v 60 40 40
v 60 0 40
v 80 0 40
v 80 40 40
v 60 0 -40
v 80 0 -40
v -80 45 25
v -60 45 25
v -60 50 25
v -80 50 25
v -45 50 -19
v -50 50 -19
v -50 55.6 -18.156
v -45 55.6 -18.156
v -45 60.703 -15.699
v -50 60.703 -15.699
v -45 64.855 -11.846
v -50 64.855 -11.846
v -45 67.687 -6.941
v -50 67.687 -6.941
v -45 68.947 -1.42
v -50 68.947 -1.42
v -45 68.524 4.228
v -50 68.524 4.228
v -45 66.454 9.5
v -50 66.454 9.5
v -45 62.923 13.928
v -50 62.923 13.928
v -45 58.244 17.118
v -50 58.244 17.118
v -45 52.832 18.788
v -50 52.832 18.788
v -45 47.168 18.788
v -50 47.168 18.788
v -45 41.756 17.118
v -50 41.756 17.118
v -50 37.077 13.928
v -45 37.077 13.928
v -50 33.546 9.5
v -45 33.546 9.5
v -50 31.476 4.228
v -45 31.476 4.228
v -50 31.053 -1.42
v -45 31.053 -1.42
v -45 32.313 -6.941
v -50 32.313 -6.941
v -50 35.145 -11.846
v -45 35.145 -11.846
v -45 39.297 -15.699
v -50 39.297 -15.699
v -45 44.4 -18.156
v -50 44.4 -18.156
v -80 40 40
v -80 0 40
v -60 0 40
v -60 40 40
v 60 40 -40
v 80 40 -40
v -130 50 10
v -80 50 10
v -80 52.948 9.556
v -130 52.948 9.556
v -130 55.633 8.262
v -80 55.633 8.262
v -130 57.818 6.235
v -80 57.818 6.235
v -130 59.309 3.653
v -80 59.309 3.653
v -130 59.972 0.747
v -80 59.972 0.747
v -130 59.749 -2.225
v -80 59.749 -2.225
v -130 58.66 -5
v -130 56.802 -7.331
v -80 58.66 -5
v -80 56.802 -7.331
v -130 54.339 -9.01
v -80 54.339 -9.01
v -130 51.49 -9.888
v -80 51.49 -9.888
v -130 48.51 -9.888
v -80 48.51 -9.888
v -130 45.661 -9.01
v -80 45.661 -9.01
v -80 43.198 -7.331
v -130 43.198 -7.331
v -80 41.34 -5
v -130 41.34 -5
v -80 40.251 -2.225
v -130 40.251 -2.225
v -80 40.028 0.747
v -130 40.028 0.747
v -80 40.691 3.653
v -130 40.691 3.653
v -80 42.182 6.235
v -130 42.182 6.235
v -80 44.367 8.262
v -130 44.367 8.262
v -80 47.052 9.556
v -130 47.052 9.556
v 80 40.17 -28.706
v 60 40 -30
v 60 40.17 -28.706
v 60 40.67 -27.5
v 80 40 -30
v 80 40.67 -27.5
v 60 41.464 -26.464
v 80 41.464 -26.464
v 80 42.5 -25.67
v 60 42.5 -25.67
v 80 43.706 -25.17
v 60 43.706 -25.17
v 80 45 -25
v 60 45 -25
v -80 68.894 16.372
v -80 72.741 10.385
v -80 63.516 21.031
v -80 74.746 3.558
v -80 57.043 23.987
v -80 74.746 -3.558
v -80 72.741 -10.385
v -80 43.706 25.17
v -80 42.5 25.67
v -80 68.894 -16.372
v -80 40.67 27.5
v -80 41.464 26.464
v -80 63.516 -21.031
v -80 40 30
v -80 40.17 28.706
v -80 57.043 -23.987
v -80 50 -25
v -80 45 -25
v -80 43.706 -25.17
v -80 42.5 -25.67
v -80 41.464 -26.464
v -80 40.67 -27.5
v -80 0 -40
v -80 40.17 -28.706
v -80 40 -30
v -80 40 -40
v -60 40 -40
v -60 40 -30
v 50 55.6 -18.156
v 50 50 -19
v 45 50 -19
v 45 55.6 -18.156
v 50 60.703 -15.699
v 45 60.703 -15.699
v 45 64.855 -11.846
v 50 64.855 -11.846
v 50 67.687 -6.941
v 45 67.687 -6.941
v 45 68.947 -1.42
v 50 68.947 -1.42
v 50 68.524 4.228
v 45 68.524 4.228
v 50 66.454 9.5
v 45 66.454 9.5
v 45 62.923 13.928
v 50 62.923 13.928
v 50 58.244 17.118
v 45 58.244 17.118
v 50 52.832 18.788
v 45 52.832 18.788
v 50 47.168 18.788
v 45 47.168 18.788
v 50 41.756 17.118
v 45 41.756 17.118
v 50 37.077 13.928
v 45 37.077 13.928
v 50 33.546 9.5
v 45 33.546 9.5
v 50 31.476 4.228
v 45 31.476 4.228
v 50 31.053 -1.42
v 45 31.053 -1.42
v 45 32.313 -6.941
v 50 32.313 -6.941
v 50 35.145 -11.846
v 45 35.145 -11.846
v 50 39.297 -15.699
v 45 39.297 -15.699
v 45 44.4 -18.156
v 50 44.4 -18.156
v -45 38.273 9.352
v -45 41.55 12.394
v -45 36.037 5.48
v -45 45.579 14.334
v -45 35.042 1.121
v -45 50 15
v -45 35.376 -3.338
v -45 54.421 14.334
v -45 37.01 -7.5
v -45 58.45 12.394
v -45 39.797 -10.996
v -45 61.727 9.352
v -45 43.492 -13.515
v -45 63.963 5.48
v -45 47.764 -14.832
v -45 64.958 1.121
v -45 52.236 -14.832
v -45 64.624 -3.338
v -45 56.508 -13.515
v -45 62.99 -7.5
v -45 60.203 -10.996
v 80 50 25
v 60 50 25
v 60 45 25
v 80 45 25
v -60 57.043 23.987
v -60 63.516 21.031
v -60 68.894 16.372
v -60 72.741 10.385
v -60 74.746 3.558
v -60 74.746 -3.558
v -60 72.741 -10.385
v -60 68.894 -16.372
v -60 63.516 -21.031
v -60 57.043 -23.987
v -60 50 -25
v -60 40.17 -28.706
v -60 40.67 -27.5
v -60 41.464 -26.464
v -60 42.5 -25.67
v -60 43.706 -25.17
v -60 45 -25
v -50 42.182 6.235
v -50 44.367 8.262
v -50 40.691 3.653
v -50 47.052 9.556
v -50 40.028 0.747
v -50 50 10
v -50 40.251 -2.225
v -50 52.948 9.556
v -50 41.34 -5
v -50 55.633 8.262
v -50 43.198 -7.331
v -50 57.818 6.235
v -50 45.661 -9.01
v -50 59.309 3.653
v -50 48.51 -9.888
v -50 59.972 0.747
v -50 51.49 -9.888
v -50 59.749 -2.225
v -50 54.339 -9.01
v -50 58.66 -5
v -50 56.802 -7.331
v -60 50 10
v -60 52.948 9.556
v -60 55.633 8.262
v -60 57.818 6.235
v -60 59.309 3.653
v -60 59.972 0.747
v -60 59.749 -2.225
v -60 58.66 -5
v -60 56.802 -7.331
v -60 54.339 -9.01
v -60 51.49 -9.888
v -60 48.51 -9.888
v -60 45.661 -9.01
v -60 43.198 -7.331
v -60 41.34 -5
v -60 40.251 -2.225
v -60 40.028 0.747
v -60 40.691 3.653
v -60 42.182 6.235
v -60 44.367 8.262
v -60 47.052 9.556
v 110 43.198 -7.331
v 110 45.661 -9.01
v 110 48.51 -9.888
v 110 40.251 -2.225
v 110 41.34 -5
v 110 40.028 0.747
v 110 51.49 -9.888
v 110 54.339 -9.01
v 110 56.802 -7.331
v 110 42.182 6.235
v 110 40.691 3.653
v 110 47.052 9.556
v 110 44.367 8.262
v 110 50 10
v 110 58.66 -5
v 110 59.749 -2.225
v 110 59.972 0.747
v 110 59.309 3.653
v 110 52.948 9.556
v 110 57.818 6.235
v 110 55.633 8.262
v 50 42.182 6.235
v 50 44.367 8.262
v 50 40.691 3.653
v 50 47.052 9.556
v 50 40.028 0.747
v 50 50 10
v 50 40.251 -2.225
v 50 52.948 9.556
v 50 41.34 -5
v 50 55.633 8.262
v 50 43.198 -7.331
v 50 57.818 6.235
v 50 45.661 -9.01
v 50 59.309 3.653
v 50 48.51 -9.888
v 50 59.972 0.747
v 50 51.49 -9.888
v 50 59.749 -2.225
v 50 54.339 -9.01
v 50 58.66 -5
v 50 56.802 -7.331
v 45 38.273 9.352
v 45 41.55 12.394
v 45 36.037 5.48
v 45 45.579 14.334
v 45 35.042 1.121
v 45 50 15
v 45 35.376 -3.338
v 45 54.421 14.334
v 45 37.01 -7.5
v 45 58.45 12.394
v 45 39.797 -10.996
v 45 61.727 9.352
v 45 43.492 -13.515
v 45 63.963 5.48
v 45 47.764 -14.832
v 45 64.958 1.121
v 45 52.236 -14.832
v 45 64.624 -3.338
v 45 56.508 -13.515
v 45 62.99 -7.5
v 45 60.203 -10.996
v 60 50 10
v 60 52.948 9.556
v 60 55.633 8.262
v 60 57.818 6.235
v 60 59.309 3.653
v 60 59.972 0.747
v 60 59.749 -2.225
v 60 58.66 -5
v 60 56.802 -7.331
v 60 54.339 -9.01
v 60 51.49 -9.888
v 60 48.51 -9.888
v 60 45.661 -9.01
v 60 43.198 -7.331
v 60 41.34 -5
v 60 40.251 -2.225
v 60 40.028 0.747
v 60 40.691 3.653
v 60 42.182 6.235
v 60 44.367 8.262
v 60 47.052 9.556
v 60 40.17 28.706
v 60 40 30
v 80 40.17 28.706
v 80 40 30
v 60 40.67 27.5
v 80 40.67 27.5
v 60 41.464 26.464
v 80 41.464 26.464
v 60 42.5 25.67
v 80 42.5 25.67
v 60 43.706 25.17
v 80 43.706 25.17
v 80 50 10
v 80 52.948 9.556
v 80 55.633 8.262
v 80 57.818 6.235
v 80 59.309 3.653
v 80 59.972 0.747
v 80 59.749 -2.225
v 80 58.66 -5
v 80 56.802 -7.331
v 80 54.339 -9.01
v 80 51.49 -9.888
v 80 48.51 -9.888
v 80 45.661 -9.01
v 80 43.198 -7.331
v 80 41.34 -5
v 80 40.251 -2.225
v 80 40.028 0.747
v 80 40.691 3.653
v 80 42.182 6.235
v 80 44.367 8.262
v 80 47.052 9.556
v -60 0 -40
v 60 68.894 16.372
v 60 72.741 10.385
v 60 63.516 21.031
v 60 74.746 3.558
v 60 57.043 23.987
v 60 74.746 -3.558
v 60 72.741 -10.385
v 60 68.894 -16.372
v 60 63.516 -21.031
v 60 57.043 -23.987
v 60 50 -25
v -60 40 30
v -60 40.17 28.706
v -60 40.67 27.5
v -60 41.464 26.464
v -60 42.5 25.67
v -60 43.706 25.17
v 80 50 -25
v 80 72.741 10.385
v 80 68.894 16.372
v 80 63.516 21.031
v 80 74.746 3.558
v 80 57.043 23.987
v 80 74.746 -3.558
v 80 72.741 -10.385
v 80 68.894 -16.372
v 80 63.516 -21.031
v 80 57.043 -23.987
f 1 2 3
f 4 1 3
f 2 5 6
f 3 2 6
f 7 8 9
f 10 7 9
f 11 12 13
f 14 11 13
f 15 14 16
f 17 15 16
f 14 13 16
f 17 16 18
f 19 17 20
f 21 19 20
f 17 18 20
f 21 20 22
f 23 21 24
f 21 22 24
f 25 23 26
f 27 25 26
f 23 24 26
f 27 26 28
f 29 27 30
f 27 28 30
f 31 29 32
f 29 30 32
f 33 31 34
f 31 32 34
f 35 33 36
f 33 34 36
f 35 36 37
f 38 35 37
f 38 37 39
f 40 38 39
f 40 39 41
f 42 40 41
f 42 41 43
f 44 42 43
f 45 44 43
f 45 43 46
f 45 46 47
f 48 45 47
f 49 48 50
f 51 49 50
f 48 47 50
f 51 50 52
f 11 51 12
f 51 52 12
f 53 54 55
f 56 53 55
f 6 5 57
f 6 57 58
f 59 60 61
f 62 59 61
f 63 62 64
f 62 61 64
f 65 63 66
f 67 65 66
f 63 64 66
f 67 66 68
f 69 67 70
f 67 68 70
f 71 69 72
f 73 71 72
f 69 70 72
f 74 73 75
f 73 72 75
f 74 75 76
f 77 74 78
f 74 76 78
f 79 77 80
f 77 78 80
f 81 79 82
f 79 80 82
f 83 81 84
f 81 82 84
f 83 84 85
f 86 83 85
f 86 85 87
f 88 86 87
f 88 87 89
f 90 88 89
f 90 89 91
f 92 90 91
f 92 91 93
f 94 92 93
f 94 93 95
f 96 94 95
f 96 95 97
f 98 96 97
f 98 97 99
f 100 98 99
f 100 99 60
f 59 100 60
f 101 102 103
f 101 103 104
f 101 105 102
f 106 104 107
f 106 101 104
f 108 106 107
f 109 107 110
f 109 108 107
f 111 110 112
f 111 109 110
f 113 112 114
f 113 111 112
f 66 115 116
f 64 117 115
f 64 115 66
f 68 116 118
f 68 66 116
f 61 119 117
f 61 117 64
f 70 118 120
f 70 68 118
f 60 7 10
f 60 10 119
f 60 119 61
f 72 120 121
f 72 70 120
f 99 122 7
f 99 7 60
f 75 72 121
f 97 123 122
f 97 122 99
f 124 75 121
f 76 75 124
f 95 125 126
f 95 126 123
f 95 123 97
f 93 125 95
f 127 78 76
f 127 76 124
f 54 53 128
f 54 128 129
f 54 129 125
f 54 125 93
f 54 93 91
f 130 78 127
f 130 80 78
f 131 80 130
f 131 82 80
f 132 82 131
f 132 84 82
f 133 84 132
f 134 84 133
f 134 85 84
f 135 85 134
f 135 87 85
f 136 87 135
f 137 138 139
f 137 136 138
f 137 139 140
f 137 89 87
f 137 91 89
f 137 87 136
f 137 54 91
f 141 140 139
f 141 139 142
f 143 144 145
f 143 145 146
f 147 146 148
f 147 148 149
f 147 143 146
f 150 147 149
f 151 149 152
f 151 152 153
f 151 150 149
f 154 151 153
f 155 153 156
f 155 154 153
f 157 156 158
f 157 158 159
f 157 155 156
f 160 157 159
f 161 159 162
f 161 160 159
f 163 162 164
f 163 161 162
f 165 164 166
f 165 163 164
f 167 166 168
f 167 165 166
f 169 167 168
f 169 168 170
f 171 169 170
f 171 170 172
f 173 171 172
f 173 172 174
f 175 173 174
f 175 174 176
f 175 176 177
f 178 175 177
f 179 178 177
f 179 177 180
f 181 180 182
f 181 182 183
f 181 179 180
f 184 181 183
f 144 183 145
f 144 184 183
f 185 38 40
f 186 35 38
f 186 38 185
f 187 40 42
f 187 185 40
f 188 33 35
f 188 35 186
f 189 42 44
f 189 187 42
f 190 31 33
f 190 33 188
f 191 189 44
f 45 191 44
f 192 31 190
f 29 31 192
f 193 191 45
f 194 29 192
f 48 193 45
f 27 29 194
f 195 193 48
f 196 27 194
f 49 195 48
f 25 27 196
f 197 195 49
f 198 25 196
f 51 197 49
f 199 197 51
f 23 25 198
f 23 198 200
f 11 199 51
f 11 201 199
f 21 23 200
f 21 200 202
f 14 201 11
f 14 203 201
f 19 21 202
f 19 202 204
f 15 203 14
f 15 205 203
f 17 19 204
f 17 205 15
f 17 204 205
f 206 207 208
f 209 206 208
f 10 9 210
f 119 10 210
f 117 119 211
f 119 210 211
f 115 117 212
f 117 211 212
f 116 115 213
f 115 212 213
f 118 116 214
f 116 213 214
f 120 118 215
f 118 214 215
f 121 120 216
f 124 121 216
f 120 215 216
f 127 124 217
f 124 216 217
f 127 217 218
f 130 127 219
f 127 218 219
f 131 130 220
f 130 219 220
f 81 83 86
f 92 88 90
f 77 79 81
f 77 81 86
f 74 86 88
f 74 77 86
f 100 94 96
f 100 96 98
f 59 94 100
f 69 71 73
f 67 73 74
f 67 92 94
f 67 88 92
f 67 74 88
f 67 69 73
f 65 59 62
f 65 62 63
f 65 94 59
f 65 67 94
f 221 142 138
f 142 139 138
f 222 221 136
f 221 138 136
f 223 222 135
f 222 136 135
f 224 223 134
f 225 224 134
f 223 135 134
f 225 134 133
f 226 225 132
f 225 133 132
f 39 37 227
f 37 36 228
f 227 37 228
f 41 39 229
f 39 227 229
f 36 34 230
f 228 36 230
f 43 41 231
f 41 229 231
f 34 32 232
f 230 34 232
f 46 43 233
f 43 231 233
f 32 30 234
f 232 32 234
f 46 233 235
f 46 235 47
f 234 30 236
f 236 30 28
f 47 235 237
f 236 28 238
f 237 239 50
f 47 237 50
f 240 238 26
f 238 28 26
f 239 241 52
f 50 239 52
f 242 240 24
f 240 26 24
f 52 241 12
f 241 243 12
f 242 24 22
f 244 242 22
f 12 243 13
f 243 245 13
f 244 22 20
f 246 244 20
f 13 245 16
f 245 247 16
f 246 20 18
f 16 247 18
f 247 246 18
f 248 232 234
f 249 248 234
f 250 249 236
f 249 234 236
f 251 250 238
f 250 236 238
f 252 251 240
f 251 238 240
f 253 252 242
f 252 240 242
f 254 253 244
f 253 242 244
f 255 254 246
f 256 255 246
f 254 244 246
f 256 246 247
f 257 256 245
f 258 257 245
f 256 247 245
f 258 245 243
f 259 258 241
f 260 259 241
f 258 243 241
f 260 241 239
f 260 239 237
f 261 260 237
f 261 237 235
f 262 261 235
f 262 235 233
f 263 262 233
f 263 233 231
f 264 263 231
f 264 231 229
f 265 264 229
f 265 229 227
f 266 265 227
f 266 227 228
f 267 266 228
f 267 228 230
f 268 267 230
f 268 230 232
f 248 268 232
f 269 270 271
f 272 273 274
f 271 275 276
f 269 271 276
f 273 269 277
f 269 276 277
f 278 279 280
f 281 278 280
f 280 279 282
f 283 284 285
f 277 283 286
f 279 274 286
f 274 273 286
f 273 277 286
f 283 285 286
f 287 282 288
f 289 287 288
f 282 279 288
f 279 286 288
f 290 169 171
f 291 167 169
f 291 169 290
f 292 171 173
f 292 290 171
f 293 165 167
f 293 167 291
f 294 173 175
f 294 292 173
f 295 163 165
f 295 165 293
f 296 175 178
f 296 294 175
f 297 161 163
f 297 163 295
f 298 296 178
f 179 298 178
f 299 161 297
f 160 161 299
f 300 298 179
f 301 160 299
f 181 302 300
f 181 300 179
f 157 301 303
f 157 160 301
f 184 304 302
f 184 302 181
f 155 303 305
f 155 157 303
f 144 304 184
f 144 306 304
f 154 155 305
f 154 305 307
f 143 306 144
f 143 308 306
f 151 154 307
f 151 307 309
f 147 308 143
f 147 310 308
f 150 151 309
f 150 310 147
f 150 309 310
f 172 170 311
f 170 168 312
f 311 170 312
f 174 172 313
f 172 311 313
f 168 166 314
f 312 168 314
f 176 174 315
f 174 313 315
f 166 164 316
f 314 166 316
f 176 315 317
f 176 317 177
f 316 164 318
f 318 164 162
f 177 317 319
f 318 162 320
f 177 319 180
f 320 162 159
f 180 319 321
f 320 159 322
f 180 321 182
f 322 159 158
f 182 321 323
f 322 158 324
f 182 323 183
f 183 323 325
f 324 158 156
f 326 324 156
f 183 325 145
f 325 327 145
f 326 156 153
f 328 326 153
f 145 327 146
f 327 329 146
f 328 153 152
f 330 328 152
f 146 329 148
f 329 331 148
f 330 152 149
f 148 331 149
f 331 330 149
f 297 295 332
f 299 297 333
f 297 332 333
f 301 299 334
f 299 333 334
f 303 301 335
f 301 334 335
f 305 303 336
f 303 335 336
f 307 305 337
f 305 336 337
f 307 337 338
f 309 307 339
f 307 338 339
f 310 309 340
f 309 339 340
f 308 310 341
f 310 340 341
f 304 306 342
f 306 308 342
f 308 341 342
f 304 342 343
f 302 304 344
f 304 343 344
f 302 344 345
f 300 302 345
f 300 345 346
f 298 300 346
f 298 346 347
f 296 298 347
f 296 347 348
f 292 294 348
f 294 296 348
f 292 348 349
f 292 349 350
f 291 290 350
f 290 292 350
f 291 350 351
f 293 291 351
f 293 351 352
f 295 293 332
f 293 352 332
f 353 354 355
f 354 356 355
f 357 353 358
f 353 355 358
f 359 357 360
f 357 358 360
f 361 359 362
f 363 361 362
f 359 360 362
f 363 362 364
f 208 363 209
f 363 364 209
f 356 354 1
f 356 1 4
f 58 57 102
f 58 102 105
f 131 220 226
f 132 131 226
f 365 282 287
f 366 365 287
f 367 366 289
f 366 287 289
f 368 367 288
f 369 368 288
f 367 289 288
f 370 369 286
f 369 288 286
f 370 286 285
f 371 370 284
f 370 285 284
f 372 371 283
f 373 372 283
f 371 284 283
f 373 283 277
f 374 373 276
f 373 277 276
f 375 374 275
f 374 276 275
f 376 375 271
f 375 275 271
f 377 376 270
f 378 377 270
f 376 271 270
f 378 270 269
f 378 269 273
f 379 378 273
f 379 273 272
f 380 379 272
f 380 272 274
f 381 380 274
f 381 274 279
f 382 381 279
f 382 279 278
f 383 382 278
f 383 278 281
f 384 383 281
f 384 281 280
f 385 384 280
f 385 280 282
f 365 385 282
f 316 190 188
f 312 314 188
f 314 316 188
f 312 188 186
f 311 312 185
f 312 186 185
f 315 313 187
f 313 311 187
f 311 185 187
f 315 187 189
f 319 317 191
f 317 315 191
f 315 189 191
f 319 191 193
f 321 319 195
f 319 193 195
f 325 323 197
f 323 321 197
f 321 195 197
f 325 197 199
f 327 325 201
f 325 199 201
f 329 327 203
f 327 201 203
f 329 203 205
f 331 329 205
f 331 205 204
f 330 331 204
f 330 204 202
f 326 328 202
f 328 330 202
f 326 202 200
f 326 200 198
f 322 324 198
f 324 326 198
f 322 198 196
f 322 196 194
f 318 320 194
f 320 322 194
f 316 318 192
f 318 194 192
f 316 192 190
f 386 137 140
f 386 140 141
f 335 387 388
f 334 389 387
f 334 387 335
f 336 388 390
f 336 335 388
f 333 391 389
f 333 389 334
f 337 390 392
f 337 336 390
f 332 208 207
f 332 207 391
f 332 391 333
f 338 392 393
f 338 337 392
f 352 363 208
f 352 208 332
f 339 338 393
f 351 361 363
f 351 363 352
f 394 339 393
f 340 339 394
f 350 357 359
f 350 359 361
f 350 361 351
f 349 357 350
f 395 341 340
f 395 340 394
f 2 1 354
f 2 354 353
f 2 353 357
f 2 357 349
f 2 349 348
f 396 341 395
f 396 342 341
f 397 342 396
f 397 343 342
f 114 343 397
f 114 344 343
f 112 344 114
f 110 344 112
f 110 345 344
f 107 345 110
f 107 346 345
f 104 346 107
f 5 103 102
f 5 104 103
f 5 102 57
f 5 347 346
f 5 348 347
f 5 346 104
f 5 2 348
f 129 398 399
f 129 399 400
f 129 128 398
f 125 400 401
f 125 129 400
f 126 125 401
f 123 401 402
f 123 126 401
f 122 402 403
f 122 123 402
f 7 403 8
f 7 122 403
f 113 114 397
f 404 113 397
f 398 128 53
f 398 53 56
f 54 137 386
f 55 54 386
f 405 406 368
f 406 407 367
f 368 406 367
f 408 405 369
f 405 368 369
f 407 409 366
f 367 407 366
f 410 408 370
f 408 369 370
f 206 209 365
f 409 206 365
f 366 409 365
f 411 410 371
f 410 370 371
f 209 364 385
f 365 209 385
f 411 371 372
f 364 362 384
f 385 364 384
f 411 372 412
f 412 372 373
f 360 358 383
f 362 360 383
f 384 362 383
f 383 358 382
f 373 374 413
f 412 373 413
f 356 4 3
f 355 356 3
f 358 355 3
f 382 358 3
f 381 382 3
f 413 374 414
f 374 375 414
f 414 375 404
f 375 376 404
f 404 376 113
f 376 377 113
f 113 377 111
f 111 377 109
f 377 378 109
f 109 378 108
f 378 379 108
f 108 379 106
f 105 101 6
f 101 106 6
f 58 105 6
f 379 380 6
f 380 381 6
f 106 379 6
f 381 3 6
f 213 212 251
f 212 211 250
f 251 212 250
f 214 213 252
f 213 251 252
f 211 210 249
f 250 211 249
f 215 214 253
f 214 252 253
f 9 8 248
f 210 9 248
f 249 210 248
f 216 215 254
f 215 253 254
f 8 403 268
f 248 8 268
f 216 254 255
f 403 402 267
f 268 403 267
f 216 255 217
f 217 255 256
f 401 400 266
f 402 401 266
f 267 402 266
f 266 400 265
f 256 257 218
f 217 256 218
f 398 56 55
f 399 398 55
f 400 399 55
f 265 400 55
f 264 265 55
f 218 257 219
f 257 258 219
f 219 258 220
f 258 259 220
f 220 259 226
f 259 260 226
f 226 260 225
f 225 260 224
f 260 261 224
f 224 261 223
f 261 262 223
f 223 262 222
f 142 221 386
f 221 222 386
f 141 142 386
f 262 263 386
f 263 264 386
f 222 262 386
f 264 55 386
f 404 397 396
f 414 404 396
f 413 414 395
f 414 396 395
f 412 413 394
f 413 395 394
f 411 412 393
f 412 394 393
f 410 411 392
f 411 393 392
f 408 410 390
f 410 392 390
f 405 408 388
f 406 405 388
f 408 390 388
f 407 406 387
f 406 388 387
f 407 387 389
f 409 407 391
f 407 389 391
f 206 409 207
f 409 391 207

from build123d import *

# Parameters (mm, degrees)
SKETCH1_W                = 20
SKETCH1_H                = 80
BOSS_EXTRUDE1_DEPTH      = 40
BOSS_EXTRUDE1_2_DEPTH    = 40
BOSS_EXTRUDE2_START      = -20
BOSS_EXTRUDE2_DEPTH      = 20
BOSS_EXTRUDE3_START      = -20
BOSS_EXTRUDE3_DEPTH      = 20
SKETCH5_R                = 10
CUT_EXTRUDE2_DEPTH       = 170
FILLET2_R                = 5
FILLET3_R                = 5
BOSS_EXTRUDE4_DEPTH      = 50
BOSS_EXTRUDE4_DEPTH_BACK = 190
SKETCH6_R                = 10
SKETCH10_R               = 19
BOSS_EXTRUDE6_DEPTH      = 5
SKETCH11_R               = 15
BOSS_EXTRUDE7_DEPTH      = 100


with BuildPart() as part:
    # Sketch1 → Boss-Extrude1 (new body)
    with BuildSketch(Plane(origin=(0, 0, 0), x_dir=(1, 0, 0), z_dir=(0, 1, 0))):
        with Locations((70, 0)):
            Rectangle(SKETCH1_W, SKETCH1_H)
    extrude(amount=BOSS_EXTRUDE1_DEPTH)

    # Sketch4 → Boss-Extrude3 (add)
    with BuildSketch(Plane(origin=(80, 0, 0), x_dir=(0, 0, -1), z_dir=(1, 0, 0)).offset(BOSS_EXTRUDE3_START)):
        with BuildLine():
            Line((-25, 50), (-25, 40))
            Line((-25, 40), (25, 40))
            Line((25, 40), (25, 50))
            ThreePointArc((25, 50), (0, 75), (-25, 50))
        make_face()
    extrude(amount=BOSS_EXTRUDE3_DEPTH)


with BuildPart() as body_2:
    # Sketch1 → Boss-Extrude1 2 (new body)
    with BuildSketch(Plane(origin=(0, 0, 0), x_dir=(1, 0, 0), z_dir=(0, 1, 0))):
        with Locations((-70, 0)):
            Rectangle(SKETCH1_W, SKETCH1_H)
    extrude(amount=BOSS_EXTRUDE1_2_DEPTH)

    # Sketch2 → Boss-Extrude2 (add)
    with BuildSketch(Plane.ZY.offset(80).offset(BOSS_EXTRUDE2_START)):
        with BuildLine():
            Line((-25, 50), (-25, 40))
            Line((-25, 40), (25, 40))
            Line((25, 40), (25, 50))
            ThreePointArc((25, 50), (0, 75), (-25, 50))
        make_face()
    extrude(amount=BOSS_EXTRUDE2_DEPTH)


with BuildPart() as cut_extrude2_tool:
    # Sketch5 → Cut-Extrude2 (new body)
    with BuildSketch(Plane.ZY.offset(80)):
        with Locations((0, 50)):
            Circle(SKETCH5_R)
    extrude(amount=-CUT_EXTRUDE2_DEPTH)


with BuildPart() as part_1:
    add(part.part)

    # Cut-Extrude2: cut by cut_extrude2_tool
    add(cut_extrude2_tool.part, mode=Mode.SUBTRACT)

    # Fillet3
    fillet3_edges = [part_1.edges().sort_by_distance(p)[0] for p in [
        (70, 40, -25),
        (70, 40, 25),
    ]]
    fillet(fillet3_edges, radius=FILLET3_R)



with BuildPart() as body_2_1:
    add(body_2.part)

    # Cut-Extrude2: cut by cut_extrude2_tool
    add(cut_extrude2_tool.part, mode=Mode.SUBTRACT)

    # Fillet2
    fillet2_edges = [body_2_1.edges().sort_by_distance(p)[0] for p in [
        (-70, 40, 25),
        (-70, 40, -25),
    ]]
    fillet(fillet2_edges, radius=FILLET2_R)


with BuildPart() as part_2:
    add(part_1.part)

    add(body_2_1.part)  # Boss-Extrude4 merges body 2
    # Sketch6 → Boss-Extrude4 (add, two sides: drawn at the far end of the back side and taken through both)
    with BuildSketch(Plane.ZY.offset(80).offset(-BOSS_EXTRUDE4_DEPTH_BACK)):
        with Locations((0, 50)):
            Circle(SKETCH6_R)
    extrude(amount=BOSS_EXTRUDE4_DEPTH + BOSS_EXTRUDE4_DEPTH_BACK)

    # Sketch10 → Boss-Extrude6 (add)
    with BuildSketch(Plane(origin=(-50, 0, 0), x_dir=(0, 0, -1), z_dir=(1, 0, 0))):
        with Locations((0, 50)):
            Circle(SKETCH10_R)
    boss_extrude6 = extrude(amount=BOSS_EXTRUDE6_DEPTH)

    # Mirror9: Boss-Extrude6 across plane
    add(boss_extrude6.mirror(Plane(origin=(0, 0, 0), x_dir=(0, 0, 1), z_dir=(1, 0, 0))))

    # Sketch11 → Boss-Extrude7 (add)
    with BuildSketch(Plane(origin=(-50, 0, 0), x_dir=(0, 0, -1), z_dir=(1, 0, 0))):
        with Locations(Location((0, 50, 0), (0, 0, 180))):
            Circle(SKETCH11_R)
    extrude(amount=BOSS_EXTRUDE7_DEPTH)


solid = part_2.part
